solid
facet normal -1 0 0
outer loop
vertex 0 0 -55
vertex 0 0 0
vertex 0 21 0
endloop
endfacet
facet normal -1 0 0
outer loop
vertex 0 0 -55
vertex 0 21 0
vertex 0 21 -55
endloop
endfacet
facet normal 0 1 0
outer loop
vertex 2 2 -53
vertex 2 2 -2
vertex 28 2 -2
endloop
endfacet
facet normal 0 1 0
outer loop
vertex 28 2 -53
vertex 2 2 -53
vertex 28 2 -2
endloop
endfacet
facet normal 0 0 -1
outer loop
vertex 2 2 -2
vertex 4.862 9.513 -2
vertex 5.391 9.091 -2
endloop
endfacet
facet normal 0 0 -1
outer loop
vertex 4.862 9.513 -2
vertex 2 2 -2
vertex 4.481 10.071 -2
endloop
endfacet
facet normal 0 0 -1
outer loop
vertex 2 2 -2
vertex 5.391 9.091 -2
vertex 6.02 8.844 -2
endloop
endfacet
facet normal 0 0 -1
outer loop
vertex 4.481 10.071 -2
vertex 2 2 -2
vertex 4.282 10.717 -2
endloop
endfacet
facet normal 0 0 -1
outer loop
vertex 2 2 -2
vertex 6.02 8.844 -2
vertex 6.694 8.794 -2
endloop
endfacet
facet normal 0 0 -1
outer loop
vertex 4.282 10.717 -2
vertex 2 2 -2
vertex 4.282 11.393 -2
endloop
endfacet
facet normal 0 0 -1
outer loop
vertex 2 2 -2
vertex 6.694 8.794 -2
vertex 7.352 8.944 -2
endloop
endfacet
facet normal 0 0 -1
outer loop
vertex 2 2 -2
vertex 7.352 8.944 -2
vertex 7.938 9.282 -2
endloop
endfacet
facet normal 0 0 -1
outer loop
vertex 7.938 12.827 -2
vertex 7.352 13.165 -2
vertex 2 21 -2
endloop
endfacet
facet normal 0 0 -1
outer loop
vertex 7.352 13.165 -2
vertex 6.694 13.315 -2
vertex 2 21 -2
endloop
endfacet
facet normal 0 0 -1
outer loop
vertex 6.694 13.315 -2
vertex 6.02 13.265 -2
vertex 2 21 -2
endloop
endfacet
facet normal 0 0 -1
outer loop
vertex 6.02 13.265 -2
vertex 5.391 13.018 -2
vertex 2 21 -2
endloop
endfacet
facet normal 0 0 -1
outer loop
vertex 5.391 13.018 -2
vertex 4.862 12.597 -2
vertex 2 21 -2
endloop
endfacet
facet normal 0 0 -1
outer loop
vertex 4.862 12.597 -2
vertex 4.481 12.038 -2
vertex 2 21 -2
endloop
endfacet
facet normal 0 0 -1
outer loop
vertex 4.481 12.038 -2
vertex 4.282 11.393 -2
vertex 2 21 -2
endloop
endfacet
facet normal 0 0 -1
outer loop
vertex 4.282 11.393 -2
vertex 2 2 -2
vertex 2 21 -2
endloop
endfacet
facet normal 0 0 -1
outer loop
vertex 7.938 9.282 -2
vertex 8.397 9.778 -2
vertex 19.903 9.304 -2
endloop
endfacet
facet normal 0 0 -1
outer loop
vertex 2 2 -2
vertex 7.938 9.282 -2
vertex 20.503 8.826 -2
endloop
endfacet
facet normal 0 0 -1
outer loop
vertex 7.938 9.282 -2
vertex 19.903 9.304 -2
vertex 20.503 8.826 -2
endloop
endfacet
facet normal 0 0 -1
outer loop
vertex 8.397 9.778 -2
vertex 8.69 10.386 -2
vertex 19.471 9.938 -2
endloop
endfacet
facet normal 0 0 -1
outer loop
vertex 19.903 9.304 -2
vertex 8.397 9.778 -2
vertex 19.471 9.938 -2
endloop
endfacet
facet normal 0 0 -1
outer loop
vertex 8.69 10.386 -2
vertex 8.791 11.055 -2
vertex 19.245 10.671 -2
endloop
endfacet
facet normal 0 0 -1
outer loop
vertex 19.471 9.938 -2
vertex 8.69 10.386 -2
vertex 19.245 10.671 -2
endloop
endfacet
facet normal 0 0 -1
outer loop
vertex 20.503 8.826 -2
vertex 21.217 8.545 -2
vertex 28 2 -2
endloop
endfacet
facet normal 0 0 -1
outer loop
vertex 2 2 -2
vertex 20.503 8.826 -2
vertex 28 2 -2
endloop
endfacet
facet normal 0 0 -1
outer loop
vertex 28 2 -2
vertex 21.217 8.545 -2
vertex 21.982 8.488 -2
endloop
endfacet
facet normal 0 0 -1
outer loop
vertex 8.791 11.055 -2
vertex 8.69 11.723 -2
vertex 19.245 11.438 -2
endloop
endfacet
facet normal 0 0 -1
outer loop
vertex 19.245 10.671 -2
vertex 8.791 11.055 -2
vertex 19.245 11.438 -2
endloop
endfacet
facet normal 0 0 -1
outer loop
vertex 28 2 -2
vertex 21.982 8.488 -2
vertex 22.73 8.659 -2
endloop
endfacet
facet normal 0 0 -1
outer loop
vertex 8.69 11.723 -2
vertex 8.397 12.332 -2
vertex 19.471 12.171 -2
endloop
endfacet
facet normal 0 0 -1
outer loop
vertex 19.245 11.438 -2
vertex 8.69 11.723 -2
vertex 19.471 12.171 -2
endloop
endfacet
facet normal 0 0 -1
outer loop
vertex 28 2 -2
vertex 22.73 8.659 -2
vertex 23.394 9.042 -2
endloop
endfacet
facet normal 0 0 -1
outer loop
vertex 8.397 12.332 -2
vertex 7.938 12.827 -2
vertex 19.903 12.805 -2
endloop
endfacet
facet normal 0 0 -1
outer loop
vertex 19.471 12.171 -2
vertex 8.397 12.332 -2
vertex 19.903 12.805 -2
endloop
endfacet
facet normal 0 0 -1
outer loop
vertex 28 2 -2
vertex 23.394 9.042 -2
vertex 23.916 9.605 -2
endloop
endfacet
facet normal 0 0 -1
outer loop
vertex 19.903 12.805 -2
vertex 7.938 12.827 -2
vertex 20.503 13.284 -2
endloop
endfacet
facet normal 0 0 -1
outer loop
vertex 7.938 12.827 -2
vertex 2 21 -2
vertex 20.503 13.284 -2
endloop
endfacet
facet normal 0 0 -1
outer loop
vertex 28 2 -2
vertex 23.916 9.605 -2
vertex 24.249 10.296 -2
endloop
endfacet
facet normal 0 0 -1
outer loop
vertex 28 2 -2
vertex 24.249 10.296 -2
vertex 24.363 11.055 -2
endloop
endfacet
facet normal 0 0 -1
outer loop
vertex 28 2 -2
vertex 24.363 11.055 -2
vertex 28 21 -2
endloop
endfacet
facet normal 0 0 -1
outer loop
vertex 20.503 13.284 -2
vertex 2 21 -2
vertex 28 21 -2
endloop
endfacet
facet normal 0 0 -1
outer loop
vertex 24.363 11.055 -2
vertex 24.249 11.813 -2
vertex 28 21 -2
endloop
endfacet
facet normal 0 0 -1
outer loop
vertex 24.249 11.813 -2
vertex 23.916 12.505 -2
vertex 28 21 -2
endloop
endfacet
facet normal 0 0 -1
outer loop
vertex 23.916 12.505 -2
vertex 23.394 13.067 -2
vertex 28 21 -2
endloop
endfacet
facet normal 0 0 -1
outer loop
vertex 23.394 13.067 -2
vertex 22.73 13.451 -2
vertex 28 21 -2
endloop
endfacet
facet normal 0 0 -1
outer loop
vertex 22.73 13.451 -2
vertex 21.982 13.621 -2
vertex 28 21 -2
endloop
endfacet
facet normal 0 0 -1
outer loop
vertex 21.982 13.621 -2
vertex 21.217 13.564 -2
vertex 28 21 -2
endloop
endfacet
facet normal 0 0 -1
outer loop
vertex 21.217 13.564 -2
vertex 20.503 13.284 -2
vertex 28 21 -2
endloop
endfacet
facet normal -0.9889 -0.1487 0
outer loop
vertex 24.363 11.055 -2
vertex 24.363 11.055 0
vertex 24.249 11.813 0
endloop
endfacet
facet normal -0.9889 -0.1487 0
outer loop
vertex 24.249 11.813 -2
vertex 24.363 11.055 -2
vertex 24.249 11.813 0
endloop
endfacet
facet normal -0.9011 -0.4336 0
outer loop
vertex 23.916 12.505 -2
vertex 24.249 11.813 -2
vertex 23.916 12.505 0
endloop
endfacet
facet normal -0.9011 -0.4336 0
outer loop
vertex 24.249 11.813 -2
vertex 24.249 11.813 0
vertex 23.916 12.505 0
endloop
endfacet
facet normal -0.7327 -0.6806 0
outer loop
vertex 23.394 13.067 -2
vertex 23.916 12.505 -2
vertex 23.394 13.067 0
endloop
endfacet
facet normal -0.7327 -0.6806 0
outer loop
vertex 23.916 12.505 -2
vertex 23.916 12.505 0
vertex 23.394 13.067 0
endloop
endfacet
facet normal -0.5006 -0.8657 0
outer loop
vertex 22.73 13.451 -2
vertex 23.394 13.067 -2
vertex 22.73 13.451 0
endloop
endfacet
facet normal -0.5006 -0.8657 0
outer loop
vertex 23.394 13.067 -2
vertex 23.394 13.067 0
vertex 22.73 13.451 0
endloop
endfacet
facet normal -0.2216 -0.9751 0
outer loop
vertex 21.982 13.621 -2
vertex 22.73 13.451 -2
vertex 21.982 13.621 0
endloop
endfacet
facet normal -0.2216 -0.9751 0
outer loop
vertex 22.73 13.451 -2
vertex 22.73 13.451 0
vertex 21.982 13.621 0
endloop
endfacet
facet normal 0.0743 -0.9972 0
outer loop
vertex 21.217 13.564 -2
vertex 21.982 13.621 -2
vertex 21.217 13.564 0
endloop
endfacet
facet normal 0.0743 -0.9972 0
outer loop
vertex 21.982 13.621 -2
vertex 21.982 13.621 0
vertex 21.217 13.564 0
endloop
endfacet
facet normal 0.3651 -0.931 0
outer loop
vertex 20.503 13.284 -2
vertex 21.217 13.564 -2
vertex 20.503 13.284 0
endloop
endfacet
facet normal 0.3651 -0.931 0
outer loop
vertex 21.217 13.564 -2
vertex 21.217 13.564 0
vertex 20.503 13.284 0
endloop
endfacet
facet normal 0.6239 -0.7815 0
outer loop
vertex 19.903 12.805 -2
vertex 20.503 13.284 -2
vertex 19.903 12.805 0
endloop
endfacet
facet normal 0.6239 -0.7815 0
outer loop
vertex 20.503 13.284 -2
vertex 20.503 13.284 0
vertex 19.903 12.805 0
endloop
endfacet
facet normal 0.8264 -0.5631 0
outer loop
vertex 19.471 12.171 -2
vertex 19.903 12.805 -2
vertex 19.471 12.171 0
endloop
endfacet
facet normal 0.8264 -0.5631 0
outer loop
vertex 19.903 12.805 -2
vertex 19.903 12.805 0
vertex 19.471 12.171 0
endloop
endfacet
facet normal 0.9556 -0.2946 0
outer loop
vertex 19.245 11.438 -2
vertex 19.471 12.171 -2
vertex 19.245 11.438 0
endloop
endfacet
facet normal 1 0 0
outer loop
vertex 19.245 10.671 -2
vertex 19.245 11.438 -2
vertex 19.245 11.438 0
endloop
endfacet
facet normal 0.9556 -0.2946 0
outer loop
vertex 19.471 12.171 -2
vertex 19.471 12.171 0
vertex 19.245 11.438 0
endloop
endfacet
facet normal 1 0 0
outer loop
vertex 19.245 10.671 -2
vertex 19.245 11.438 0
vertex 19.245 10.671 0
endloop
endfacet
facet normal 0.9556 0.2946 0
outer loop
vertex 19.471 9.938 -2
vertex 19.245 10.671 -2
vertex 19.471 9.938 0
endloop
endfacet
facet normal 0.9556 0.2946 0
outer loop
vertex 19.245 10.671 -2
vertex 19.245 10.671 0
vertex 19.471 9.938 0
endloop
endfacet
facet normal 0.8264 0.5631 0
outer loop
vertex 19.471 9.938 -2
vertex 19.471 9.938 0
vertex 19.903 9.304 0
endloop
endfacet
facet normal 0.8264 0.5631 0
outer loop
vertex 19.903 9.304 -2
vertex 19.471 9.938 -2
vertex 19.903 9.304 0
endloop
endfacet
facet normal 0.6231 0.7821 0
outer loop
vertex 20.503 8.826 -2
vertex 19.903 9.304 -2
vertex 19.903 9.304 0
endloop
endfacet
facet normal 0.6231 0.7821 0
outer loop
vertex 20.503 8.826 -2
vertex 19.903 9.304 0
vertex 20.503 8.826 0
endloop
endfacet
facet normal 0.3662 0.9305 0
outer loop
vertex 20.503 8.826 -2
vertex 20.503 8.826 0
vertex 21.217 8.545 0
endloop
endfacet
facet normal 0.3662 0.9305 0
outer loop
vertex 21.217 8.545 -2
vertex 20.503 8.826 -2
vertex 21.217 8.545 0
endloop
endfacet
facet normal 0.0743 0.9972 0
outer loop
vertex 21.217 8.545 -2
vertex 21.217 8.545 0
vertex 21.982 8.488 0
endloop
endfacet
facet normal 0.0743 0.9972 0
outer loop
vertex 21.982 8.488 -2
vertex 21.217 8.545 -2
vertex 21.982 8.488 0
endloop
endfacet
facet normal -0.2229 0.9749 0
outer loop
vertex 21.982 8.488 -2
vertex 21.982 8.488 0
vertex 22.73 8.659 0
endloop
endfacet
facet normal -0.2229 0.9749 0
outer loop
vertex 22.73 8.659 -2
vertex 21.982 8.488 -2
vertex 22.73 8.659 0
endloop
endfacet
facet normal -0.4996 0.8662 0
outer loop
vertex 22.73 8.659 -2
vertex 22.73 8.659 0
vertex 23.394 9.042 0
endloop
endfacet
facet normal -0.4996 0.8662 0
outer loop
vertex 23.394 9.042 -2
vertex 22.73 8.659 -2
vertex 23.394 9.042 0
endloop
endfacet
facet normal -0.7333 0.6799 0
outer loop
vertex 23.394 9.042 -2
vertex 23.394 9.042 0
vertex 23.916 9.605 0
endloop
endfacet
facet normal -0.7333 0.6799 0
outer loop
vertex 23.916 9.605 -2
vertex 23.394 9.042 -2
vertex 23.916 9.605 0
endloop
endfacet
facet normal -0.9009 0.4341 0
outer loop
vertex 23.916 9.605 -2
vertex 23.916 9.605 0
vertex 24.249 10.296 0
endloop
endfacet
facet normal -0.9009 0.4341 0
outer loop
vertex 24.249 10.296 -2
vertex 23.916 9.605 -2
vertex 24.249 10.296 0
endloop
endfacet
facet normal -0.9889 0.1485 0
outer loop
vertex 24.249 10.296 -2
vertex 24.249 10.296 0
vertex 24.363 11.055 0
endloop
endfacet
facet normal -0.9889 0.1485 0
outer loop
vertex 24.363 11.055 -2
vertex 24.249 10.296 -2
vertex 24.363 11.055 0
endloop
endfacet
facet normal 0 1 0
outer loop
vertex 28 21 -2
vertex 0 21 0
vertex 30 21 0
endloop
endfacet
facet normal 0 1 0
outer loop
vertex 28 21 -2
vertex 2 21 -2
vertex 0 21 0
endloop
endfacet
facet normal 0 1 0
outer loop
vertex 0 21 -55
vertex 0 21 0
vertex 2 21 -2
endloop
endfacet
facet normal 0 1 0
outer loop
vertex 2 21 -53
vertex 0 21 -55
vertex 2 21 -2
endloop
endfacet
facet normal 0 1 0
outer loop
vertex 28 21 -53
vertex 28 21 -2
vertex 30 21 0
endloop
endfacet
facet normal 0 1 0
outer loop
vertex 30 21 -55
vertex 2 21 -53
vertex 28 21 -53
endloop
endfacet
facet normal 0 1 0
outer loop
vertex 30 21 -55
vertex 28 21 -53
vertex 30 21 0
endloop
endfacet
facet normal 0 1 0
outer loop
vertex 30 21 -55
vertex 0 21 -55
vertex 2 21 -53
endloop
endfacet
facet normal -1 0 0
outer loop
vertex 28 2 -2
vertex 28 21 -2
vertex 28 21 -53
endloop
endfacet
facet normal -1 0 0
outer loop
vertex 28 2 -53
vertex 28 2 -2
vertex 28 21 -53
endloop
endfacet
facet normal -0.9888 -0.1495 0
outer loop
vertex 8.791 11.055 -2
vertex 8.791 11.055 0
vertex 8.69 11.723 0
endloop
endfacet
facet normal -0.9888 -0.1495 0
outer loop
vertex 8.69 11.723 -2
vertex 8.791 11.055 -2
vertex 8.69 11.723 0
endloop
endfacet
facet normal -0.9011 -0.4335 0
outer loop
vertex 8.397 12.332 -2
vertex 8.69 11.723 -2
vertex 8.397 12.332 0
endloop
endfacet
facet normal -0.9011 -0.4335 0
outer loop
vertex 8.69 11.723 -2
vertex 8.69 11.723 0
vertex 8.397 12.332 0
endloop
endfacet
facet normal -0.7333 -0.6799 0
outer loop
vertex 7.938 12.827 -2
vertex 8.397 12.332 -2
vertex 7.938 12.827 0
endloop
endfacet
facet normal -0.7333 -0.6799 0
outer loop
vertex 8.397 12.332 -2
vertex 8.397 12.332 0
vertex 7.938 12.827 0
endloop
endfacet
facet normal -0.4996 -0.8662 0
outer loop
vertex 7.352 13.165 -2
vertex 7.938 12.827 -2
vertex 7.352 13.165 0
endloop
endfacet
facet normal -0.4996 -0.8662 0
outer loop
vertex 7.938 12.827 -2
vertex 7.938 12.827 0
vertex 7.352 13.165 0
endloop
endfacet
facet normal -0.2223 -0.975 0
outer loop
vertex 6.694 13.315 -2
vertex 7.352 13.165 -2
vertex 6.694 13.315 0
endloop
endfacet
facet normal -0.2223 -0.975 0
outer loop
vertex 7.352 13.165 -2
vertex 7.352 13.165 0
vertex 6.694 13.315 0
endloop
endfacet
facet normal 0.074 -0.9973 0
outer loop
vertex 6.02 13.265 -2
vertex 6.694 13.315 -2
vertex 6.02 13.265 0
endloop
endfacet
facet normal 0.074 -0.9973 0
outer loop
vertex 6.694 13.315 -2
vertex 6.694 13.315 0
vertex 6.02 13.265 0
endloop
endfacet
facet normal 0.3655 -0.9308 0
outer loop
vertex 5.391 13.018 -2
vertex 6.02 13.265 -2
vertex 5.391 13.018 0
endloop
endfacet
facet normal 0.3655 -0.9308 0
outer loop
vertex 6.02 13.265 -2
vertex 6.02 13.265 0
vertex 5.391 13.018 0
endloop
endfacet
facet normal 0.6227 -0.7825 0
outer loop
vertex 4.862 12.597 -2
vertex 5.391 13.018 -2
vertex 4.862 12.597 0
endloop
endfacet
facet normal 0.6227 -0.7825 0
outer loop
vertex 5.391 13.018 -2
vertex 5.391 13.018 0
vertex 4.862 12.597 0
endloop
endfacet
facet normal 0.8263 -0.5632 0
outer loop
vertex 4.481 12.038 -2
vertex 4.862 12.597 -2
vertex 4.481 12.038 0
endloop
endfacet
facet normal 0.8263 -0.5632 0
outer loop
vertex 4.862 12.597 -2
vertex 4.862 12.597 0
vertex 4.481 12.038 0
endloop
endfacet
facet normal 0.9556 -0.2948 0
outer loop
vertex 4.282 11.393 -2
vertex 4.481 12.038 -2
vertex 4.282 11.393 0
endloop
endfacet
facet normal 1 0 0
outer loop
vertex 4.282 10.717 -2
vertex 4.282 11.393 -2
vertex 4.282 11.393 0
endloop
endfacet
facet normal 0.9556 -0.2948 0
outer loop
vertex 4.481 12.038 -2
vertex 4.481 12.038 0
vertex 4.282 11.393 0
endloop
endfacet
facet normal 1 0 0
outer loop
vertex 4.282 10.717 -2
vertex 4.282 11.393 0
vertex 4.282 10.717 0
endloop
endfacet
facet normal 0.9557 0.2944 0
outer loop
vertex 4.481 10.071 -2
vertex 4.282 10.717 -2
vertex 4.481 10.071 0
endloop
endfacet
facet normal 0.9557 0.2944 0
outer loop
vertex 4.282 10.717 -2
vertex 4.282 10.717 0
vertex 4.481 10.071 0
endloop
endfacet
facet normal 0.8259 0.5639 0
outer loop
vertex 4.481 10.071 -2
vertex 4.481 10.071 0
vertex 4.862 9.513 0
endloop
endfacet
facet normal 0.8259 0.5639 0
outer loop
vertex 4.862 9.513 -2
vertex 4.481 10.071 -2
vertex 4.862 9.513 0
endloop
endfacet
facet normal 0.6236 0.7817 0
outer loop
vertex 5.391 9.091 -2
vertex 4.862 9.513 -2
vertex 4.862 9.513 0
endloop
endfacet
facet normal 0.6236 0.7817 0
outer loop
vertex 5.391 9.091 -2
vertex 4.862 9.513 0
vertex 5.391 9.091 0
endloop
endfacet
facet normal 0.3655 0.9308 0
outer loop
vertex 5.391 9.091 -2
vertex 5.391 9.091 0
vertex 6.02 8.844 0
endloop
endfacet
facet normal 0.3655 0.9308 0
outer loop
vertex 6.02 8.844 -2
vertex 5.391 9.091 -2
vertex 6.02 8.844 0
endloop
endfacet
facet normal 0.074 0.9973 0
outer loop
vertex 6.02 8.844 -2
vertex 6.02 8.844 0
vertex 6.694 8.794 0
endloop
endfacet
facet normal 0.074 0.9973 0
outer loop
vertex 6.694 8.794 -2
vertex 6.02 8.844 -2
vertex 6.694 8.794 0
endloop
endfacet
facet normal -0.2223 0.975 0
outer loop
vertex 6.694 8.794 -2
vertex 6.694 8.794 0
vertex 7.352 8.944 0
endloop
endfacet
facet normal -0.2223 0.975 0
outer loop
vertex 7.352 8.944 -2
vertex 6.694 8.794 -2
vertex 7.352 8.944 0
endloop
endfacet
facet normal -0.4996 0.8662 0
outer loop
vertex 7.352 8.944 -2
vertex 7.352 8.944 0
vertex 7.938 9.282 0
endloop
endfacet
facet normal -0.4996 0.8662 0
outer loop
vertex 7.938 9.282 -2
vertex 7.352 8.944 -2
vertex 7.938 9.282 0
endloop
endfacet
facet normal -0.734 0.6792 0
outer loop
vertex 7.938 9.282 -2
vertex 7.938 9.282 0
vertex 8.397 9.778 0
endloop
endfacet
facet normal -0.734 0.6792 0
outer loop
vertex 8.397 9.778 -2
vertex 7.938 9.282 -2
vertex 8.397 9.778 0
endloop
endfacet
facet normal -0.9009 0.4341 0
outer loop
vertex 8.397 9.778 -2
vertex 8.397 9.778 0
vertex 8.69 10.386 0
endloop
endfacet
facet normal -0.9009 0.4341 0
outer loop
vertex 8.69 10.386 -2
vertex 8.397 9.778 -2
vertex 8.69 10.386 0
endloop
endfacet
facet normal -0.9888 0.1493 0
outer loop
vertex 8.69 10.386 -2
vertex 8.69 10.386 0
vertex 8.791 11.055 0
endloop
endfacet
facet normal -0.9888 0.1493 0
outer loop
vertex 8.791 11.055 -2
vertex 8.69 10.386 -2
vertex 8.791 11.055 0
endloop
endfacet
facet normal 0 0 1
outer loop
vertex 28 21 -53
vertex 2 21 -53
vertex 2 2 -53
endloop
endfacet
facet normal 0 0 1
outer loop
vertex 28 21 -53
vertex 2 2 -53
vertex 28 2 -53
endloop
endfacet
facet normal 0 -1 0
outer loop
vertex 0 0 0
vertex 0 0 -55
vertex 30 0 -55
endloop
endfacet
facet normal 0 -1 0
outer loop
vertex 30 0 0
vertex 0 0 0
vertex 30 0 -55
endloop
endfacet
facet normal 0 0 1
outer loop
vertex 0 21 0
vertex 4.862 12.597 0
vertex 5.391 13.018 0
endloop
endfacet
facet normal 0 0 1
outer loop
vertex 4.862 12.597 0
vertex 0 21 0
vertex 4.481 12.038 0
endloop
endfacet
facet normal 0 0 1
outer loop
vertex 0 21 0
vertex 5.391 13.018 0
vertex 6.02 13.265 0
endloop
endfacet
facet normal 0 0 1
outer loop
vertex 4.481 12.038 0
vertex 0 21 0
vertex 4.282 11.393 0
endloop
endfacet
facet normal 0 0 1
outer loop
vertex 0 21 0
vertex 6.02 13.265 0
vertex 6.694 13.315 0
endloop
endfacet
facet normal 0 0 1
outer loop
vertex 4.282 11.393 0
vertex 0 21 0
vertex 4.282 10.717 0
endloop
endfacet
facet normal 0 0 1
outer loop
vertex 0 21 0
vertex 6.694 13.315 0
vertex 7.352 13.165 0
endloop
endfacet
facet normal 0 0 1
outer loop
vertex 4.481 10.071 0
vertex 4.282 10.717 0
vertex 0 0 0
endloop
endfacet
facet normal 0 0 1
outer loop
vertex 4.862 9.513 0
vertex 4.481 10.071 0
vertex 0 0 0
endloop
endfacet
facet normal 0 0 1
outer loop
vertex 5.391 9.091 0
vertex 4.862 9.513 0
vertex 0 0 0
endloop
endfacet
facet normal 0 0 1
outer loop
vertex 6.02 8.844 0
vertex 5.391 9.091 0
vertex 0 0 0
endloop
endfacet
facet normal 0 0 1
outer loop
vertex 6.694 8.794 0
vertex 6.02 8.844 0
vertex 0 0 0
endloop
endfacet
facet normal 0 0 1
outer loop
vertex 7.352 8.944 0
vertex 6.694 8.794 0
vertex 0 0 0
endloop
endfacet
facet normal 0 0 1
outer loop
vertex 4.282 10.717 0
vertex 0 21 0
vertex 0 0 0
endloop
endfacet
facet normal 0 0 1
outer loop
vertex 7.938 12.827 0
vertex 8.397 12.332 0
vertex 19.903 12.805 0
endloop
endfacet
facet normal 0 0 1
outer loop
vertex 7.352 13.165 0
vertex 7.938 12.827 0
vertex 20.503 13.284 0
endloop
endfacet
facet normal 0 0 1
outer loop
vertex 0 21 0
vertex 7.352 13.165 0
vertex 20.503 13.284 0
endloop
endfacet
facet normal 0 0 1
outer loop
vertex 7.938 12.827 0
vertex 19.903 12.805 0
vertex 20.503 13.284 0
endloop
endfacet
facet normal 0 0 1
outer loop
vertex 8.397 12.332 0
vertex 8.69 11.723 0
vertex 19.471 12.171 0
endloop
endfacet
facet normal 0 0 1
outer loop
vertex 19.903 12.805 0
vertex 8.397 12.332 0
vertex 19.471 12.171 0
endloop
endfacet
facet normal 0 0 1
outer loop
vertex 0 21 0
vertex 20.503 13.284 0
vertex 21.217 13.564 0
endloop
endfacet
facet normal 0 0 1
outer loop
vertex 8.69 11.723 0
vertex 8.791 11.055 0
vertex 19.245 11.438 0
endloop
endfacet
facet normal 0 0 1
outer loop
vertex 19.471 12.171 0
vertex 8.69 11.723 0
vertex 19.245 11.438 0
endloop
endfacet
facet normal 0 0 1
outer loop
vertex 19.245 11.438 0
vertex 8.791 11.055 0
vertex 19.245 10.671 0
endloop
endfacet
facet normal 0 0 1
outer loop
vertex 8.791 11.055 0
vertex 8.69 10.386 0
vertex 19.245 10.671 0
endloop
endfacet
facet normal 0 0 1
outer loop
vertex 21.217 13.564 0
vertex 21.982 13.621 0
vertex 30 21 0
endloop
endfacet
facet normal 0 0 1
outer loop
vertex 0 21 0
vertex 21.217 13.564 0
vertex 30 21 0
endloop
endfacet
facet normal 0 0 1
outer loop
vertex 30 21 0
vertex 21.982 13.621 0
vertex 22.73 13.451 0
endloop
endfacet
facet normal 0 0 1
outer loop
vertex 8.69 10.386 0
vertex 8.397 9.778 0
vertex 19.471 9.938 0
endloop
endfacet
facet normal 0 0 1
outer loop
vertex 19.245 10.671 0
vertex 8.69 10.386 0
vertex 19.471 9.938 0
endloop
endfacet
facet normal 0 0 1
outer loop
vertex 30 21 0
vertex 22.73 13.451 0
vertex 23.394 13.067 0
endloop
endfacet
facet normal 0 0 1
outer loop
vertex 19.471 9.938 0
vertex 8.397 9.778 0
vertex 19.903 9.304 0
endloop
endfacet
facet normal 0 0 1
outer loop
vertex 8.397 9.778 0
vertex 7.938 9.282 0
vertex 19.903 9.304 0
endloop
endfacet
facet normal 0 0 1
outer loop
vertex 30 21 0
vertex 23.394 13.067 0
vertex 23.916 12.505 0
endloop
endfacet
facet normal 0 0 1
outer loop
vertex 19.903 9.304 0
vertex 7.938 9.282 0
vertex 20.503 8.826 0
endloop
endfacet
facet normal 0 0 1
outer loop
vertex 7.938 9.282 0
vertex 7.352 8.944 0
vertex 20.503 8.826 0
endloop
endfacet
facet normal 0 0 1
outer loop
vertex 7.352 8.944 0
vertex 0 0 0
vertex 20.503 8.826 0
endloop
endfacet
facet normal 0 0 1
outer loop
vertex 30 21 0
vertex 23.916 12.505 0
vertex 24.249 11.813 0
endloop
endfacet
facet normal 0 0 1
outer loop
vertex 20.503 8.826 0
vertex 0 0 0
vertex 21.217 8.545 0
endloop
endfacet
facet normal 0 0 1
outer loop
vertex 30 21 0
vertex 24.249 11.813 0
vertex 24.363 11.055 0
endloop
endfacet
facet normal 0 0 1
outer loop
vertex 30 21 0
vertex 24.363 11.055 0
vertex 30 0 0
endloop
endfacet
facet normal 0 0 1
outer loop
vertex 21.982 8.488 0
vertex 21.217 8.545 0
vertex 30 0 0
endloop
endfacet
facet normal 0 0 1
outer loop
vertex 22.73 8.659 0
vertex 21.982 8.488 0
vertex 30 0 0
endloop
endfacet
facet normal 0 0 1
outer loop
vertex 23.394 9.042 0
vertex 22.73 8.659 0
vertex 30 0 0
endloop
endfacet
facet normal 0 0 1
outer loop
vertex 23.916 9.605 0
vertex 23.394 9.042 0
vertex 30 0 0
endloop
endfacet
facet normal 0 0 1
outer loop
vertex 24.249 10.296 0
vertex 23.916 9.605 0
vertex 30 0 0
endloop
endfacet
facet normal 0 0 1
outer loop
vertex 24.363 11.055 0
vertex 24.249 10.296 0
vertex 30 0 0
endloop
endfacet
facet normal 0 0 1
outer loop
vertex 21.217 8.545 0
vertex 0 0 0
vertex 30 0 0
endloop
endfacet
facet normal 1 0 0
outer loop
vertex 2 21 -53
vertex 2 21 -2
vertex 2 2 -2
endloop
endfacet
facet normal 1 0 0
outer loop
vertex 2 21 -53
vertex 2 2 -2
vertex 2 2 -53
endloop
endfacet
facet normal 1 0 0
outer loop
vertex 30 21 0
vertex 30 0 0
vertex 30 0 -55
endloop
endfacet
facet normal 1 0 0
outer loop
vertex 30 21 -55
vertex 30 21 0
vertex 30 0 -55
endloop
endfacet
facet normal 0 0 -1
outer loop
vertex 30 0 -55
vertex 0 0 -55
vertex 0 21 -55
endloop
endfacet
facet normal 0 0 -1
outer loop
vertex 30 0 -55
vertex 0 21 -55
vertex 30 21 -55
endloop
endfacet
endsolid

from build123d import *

# Parameters (mm, degrees)
SKETCH_1_W          = 30
SKETCH_1_H          = 55
EXTRUDE_1_DEPTH     = 21
SKETCH_2_W          = 26
SKETCH_2_H          = 51
CUT_EXTRUDE_1_DEPTH = 19
SKETCH_3_R          = 2.2671126
SKETCH_3_R_2        = 2.57383576
CUT_EXTRUDE_2_DEPTH = 3


with BuildPart() as part:
    # Эскиз1 → Бобышка-Вытянуть1 (new body)
    with BuildSketch(Plane(origin=(0, 0, 0), x_dir=(1, 0, 0), z_dir=(0, 1, 0))):
        with Locations((15, 27.5)):
            Rectangle(SKETCH_1_W, SKETCH_1_H)
    extrude(amount=EXTRUDE_1_DEPTH)

    # Эскиз2 → Вырез-Вытянуть1 (cut)
    with BuildSketch(Plane(origin=(0, 21, 0), x_dir=(1, 0, 0), z_dir=(0, 1, 0))):
        with Locations((15, 27.5)):
            Rectangle(SKETCH_2_W, SKETCH_2_H)
    extrude(amount=-CUT_EXTRUDE_1_DEPTH, mode=Mode.SUBTRACT)

    # Эскиз3 → Вырез-Вытянуть2 (cut)
    with BuildSketch(Plane.XY):
        with Locations((6.524092584, 11.054705983)):
            Circle(SKETCH_3_R)
        with Locations((21.789601228, 11.054705983)):
            Circle(SKETCH_3_R_2)
    extrude(amount=-CUT_EXTRUDE_2_DEPTH, mode=Mode.SUBTRACT)


solid = part.part
